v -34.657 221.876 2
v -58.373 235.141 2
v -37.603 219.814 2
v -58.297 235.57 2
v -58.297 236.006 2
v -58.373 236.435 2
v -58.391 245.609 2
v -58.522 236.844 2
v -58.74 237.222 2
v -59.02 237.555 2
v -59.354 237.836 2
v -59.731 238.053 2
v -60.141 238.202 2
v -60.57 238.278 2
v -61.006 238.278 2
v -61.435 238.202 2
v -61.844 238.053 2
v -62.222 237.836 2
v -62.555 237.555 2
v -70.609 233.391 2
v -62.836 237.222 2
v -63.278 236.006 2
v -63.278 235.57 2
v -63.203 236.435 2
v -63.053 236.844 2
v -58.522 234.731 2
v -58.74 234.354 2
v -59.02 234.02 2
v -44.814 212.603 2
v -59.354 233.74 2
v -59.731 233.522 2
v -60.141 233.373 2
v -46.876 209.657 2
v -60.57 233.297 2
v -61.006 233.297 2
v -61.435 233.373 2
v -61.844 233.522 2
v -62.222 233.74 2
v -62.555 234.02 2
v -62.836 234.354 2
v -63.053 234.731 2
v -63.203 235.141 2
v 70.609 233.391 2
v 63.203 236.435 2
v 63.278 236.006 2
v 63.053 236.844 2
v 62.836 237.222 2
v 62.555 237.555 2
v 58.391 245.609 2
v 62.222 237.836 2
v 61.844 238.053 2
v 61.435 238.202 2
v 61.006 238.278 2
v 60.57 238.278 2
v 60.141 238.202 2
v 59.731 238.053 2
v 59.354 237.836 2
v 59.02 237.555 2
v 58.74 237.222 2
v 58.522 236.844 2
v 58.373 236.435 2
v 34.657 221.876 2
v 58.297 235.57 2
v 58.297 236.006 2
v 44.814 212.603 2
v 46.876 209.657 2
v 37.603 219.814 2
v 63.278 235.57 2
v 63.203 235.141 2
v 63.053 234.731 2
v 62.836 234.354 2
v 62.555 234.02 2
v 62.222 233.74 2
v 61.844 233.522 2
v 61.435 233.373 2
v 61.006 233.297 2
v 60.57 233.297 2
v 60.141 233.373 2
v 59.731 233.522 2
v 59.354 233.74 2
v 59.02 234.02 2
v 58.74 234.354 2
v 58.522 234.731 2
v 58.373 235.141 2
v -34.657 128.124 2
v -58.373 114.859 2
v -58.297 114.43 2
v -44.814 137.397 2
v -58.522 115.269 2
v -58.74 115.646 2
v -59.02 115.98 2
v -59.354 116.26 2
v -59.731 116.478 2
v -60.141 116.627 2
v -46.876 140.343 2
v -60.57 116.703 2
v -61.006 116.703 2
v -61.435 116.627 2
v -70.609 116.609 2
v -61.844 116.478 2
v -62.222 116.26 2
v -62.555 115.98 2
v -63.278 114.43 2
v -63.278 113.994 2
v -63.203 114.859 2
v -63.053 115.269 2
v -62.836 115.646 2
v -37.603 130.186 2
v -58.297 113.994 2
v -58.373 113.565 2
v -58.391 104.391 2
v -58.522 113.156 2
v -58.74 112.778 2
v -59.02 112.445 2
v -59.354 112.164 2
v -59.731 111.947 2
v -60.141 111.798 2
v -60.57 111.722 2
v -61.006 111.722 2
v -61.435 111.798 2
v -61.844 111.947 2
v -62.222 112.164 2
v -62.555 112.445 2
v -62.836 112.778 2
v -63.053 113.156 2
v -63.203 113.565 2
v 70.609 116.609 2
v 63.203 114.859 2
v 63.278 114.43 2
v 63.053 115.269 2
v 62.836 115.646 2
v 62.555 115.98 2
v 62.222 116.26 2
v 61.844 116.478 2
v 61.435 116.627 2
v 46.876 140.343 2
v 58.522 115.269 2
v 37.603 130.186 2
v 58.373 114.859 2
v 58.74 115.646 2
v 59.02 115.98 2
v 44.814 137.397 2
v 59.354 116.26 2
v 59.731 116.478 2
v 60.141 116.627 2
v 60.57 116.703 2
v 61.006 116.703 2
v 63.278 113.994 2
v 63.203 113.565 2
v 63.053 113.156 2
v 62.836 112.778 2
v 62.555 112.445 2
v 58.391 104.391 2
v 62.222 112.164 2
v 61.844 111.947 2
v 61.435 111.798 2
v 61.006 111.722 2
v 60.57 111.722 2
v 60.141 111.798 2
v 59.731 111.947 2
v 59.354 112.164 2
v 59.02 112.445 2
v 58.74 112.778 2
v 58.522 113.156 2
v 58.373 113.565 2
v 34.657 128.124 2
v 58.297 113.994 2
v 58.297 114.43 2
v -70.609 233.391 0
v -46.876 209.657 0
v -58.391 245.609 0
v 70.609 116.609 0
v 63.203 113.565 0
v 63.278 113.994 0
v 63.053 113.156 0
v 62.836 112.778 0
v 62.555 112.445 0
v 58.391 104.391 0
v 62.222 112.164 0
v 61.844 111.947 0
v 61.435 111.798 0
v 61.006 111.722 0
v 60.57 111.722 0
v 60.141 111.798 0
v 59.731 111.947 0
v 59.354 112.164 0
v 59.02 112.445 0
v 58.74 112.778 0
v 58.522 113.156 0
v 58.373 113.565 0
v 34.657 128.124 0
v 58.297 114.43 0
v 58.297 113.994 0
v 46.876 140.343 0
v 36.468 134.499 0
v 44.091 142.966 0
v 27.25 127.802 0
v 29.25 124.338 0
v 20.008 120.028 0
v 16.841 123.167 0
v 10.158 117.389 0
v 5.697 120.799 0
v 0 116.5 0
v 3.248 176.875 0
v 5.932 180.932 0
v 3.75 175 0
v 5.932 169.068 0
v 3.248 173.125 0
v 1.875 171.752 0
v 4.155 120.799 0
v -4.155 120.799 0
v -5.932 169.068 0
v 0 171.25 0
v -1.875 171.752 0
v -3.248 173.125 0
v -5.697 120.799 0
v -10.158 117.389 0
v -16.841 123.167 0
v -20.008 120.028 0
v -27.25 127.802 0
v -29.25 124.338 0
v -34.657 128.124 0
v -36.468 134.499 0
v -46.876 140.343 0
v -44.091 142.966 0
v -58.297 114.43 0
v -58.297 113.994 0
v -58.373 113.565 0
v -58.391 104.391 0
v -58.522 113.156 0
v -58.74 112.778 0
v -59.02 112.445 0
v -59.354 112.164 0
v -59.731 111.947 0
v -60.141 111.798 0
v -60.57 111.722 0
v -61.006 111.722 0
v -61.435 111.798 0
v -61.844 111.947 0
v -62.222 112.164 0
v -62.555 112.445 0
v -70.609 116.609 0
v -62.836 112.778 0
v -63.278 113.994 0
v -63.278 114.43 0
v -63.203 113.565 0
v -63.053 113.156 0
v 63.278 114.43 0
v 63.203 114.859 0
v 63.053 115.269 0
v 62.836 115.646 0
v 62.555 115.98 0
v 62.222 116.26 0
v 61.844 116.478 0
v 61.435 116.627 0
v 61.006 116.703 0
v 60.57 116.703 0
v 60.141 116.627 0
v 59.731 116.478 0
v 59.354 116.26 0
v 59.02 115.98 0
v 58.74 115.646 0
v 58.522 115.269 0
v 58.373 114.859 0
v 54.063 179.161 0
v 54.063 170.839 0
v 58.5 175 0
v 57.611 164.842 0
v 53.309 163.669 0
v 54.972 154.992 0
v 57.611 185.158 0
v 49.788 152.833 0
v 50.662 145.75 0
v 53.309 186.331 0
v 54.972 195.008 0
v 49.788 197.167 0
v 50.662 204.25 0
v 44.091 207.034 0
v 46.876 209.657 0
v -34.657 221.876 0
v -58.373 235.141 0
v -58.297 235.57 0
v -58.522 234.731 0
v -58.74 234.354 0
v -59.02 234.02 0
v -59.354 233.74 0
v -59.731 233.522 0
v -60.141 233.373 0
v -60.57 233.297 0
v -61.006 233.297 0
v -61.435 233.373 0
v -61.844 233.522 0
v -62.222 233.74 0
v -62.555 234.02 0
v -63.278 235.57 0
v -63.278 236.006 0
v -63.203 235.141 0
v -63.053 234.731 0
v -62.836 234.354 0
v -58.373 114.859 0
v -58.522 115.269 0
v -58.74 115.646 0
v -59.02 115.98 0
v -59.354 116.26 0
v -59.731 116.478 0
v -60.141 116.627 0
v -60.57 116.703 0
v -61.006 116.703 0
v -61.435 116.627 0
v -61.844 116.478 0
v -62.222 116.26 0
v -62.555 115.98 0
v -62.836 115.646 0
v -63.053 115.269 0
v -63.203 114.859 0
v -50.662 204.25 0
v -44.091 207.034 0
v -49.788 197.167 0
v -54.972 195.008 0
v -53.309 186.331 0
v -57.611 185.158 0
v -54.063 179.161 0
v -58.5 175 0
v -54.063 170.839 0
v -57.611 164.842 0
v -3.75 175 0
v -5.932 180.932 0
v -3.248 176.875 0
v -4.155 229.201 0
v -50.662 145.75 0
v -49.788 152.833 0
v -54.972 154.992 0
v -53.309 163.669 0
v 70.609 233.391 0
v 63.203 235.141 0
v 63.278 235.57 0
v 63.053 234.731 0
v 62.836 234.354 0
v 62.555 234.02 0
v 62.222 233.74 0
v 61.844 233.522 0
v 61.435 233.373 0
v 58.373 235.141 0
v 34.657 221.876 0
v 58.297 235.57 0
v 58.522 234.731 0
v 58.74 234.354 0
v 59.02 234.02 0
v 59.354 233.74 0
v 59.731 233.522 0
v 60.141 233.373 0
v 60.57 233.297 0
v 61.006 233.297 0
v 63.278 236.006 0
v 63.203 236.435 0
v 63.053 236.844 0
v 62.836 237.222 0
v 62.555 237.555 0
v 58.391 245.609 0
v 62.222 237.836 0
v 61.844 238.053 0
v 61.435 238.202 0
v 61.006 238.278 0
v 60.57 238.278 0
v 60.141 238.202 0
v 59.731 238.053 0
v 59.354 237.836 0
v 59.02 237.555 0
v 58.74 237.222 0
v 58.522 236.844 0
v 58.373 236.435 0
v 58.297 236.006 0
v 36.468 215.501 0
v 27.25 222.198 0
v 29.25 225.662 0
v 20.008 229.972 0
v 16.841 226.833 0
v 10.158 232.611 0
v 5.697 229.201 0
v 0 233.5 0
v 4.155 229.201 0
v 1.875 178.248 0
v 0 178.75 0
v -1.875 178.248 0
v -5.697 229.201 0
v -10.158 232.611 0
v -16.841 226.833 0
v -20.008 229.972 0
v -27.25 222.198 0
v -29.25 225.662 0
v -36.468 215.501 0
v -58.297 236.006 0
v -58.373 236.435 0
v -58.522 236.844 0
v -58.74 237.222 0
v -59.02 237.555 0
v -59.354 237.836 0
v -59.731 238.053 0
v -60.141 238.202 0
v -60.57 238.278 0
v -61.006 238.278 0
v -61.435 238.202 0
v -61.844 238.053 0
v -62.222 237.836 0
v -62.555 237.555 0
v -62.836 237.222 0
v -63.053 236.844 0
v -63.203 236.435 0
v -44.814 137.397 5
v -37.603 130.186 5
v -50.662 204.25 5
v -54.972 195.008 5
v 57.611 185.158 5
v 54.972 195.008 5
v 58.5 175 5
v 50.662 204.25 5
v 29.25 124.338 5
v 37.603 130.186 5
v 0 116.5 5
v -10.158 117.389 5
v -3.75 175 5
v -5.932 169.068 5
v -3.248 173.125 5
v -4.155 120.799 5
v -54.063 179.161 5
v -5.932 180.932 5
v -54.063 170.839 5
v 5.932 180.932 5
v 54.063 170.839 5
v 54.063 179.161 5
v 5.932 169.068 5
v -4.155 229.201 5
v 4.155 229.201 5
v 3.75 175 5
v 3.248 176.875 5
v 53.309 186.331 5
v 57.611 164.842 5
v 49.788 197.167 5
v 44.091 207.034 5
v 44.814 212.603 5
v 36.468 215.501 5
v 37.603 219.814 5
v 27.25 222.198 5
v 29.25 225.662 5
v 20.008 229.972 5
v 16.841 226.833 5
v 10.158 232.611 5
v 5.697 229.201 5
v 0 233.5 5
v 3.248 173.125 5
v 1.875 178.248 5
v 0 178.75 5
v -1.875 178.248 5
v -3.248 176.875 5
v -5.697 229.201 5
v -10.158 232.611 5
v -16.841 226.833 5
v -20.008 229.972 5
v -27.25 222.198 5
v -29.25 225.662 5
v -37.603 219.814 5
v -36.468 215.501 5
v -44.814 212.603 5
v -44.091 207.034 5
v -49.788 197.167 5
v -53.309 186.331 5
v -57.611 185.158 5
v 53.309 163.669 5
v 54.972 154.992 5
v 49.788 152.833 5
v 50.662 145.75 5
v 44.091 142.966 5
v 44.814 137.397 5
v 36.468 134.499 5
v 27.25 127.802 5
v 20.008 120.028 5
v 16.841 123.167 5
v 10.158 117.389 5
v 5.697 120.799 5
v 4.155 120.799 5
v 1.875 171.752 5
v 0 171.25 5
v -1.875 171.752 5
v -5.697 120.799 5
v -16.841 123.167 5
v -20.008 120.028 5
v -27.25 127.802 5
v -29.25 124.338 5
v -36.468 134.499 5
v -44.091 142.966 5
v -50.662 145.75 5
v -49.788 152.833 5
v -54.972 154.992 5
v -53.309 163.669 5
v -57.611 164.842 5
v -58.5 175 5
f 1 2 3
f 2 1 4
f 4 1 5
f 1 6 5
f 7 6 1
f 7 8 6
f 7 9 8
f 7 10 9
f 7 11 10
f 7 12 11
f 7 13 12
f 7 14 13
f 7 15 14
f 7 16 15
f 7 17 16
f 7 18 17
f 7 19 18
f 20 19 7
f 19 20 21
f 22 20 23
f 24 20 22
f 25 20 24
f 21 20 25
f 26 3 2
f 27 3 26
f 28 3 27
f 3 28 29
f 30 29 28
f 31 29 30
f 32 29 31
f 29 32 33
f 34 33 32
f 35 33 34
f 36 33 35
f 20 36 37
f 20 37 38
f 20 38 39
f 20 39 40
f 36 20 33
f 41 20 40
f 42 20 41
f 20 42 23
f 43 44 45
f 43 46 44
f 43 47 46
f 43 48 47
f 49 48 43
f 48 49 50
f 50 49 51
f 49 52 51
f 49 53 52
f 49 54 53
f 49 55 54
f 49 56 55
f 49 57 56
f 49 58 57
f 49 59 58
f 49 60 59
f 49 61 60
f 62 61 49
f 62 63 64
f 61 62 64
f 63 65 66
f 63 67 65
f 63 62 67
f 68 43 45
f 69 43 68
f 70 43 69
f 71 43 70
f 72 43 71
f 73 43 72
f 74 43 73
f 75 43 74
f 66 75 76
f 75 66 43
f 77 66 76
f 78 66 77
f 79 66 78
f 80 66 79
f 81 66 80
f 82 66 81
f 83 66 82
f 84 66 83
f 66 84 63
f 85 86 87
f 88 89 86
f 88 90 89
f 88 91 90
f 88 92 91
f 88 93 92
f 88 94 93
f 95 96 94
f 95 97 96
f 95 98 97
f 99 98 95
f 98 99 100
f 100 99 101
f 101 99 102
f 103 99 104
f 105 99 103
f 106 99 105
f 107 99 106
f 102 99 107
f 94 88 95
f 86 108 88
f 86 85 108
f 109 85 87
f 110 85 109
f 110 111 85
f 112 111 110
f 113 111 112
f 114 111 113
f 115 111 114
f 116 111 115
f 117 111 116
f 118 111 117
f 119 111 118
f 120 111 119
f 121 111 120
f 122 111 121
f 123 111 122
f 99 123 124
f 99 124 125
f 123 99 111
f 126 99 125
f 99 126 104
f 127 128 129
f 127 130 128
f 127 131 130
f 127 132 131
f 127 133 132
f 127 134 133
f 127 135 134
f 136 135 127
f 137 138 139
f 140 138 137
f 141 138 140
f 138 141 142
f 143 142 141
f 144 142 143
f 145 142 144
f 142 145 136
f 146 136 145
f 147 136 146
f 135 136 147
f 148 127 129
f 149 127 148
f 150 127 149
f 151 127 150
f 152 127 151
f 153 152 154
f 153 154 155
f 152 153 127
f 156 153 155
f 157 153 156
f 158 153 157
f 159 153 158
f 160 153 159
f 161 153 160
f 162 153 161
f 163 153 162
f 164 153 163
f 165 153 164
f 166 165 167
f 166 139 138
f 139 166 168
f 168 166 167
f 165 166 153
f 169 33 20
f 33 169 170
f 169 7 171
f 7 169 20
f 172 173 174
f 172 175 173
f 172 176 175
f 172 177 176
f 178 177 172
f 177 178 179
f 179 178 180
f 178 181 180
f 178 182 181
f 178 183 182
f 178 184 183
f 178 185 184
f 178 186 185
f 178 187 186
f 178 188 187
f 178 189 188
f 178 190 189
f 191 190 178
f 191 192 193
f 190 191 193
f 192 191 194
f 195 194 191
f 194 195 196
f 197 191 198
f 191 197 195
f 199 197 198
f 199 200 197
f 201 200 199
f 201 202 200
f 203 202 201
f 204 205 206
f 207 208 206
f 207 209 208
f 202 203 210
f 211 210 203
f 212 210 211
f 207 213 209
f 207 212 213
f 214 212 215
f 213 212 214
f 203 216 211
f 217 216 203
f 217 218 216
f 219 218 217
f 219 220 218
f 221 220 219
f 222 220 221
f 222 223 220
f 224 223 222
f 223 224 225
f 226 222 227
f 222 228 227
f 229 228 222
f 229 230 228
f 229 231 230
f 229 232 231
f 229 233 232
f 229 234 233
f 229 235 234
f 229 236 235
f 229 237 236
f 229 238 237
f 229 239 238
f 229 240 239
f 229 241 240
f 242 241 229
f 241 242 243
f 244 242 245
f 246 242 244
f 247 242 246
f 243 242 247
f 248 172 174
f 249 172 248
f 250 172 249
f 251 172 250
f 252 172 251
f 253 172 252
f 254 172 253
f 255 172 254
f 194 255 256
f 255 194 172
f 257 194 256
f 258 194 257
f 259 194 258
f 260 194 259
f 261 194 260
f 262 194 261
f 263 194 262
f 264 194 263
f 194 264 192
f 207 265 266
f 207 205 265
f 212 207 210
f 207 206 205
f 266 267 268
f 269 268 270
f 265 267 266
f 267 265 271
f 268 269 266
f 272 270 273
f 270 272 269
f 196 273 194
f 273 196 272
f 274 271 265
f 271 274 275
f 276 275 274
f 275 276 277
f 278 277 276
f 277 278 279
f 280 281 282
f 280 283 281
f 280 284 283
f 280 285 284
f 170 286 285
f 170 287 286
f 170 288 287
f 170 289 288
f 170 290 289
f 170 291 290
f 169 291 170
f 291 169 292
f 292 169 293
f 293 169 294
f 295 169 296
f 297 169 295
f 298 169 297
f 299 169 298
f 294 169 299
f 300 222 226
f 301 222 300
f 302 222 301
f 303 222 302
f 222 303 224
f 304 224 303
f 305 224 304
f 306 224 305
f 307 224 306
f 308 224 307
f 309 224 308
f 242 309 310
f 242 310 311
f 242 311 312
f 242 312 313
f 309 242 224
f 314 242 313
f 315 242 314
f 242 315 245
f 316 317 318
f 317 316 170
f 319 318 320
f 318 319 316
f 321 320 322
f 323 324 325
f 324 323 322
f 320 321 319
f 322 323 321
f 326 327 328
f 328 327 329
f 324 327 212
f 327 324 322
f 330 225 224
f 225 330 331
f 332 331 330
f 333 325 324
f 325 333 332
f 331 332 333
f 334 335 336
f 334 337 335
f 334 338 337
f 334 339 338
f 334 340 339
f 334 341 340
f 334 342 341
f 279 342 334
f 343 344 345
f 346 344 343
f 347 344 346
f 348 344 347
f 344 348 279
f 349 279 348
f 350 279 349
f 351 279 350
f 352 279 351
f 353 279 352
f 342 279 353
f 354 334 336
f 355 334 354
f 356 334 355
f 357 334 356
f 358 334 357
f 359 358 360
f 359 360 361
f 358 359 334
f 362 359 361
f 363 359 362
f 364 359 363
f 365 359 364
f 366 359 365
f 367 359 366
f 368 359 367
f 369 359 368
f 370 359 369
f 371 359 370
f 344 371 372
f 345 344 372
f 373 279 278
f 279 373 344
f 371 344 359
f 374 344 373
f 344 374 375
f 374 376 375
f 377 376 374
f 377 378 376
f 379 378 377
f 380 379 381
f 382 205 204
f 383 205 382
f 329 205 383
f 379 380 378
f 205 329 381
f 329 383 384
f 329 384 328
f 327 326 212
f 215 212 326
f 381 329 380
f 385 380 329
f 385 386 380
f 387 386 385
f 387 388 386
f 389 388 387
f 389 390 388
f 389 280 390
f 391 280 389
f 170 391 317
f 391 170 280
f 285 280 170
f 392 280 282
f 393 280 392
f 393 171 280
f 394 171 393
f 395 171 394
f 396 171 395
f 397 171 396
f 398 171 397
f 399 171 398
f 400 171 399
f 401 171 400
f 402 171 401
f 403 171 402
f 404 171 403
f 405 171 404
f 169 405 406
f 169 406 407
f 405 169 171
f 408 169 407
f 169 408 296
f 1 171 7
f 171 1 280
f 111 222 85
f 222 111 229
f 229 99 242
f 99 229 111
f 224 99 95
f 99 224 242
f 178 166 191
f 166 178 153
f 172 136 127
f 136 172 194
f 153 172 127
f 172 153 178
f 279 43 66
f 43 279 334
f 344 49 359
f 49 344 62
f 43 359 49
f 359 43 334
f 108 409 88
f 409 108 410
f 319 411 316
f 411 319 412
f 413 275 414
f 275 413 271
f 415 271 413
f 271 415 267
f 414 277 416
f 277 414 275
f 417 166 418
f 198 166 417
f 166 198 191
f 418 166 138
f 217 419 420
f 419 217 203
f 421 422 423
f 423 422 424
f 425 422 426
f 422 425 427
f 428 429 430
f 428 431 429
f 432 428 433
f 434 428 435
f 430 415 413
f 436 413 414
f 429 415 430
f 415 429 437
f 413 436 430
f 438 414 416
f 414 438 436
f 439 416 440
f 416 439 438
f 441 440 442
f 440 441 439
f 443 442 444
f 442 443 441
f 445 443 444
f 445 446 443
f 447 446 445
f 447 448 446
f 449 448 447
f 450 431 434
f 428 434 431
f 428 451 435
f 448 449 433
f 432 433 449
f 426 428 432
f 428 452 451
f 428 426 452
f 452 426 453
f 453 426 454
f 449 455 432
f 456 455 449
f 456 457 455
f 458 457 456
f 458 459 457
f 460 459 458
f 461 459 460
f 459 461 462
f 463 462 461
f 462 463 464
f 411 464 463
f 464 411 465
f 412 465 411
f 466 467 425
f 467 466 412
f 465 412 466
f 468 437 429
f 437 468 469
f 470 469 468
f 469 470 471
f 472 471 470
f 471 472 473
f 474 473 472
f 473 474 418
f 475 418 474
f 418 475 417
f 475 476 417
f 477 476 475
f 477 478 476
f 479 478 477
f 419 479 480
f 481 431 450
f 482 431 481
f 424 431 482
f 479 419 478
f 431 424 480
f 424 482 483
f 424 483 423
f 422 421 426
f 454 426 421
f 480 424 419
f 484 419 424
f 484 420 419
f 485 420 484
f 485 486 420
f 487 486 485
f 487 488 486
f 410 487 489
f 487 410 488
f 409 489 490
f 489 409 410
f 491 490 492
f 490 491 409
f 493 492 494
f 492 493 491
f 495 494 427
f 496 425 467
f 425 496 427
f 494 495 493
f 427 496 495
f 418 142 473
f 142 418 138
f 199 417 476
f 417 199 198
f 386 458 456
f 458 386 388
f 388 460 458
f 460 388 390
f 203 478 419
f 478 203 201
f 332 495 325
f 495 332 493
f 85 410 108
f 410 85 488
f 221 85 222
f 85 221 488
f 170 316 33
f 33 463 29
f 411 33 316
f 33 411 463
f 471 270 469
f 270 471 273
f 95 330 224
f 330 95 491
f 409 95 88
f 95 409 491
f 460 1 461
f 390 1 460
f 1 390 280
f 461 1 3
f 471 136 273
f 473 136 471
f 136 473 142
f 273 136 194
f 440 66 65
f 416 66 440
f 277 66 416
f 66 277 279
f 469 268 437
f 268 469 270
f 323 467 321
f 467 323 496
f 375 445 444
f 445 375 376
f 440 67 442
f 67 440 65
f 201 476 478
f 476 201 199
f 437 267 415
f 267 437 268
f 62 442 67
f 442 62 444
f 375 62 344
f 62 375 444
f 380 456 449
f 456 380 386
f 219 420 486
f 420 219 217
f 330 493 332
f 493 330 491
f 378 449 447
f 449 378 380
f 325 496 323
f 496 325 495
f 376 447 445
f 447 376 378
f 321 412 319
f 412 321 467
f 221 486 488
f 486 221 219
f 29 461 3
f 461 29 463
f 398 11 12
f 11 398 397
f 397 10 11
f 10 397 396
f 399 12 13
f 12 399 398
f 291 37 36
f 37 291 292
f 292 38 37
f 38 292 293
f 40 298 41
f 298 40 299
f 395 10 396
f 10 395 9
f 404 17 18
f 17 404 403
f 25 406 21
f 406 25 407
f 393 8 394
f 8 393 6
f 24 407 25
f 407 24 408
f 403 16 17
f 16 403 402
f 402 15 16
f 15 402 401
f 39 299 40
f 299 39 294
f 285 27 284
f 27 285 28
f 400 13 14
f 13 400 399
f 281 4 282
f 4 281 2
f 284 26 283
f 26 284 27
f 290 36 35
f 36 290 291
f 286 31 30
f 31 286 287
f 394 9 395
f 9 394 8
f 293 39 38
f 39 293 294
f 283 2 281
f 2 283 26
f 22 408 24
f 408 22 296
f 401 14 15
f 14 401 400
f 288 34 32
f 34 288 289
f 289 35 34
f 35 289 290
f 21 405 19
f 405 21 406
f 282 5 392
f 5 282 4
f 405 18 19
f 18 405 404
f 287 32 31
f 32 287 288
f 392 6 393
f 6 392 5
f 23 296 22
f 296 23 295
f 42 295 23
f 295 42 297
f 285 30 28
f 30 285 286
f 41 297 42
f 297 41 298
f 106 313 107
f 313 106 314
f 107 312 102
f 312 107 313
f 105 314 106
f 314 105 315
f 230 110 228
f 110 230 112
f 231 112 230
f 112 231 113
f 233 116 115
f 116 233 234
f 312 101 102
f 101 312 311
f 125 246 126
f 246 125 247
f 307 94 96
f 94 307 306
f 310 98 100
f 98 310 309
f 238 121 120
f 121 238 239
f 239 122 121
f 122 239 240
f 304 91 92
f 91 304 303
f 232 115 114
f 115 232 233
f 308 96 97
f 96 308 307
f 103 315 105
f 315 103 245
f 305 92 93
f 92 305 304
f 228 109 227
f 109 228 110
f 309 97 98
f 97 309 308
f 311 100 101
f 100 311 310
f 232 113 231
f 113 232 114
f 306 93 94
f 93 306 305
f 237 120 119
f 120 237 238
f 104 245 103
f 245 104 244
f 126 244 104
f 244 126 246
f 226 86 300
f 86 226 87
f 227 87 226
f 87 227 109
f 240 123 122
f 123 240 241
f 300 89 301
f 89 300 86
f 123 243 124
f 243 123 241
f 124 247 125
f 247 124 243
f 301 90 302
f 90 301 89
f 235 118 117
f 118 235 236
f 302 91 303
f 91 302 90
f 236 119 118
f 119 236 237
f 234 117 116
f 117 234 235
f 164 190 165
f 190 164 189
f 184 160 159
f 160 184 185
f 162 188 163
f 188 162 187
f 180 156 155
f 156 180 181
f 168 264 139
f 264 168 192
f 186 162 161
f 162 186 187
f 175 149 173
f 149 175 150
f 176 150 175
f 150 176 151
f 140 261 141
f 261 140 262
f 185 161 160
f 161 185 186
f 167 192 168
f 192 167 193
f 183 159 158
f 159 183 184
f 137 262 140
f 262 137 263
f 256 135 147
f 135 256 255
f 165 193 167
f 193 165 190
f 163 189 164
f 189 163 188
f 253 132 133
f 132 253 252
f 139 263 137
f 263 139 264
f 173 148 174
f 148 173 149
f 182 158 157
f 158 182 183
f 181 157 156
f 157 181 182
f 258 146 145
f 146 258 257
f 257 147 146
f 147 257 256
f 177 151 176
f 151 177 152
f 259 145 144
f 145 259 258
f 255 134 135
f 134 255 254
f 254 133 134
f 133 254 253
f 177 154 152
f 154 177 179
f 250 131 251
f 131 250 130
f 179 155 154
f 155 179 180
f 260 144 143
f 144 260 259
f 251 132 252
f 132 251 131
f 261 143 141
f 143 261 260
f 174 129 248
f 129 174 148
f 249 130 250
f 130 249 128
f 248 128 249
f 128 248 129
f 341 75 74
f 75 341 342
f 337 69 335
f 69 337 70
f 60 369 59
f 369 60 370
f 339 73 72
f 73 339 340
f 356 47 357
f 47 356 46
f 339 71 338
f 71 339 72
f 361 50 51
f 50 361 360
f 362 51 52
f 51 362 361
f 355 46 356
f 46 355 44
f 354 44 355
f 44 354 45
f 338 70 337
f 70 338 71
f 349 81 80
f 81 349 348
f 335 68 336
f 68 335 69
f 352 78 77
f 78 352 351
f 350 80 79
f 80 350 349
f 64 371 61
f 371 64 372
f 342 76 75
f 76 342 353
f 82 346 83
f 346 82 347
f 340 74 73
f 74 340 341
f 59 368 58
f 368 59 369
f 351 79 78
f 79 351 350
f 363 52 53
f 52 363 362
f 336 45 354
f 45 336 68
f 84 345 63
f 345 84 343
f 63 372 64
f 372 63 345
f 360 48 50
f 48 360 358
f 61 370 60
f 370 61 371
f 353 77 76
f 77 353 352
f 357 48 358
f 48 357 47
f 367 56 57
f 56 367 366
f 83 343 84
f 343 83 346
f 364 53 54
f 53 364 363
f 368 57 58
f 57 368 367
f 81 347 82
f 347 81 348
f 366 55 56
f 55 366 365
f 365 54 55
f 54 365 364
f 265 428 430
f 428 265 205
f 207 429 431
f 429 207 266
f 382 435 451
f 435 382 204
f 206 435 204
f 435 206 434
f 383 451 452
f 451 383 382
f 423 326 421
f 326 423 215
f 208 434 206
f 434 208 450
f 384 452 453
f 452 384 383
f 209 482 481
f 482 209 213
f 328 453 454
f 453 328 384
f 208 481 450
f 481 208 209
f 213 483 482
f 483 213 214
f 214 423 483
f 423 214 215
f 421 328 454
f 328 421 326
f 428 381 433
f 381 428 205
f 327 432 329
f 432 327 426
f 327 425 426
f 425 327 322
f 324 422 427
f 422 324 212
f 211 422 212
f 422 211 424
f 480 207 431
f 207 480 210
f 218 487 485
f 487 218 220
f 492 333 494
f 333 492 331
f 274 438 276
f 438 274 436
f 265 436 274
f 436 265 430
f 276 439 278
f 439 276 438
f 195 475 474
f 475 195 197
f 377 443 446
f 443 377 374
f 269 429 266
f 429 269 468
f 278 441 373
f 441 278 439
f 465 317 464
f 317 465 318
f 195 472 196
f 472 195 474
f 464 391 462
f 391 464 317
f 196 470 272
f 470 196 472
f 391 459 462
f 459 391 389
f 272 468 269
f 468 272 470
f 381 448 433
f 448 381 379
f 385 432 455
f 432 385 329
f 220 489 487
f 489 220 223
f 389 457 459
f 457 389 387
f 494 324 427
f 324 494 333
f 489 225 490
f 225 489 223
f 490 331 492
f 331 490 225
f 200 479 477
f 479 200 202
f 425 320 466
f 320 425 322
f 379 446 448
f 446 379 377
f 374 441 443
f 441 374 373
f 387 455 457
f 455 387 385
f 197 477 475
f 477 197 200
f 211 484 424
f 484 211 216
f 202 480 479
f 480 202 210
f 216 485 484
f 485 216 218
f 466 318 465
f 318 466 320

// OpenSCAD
/* 
  Lazy Susan Rotary Encoder mount:
  
  Mount for lazy susan with a rotary encoder slot in the middle to allow for detection of rotation.
  
  [Design borrowed heavily from Phat Justice]  
*/

doProj                  = false;   // Do 2D projection to allow to print
quality                 = 36;      // "Roundness" of circles.

// Thicknesss
OuterThickness          = 2;       // Thickness of outer stuff
InnerThickness          = 5;       // Thickness of inner stuff
WallThickness           = 2;       // Thickness of the wall

// Spokes
spokes                   = 4;
SpokeDiameter            = 4.15;

// ## TOP SETTINGS ########################
TopPillarDimension       = 6.9;
TopPillarHeight          = 5;
TopPillarDistance        = 150;    // measured edge to edge

// Screw holes
TopScrewHoleDimension    = 2;

TopCenterBoreDiameter    = 116;    // That huge hole in the middle of the bearing
TopArmLength             = sqrt(2 * (TopPillarDistance/2 * TopPillarDistance/2));
TopArmWidth              = 13.28;

// ## BOTTOM SETTINGS ########################
BottomCenterBoreDiameter = 113;    // That huge hole in the middle of the bearing

// Bottom screw holes
BottomHoleDimension      = 5;
BottomHoleDistance       = 129;    // measured edge to edge

// Center hole
BottomCenterHoleDiameter = 7.5;

// Arms
BottomArmLength          = sqrt(2 * (BottomHoleDistance/2 * BottomHoleDistance/2));
BottomArmWidth           = 13.28;

if (doProj) {
  projection() bottom_plate();
}
else {
  bottom_plate();
}

module top_plate()  {
  render() {
    difference()
    {
      union()
      {
        // Center of the adapter plate
        cylinder(r=TopCenterBoreDiameter/2 + WallThickness, h=InnerThickness, $fn=quality);
        
        // Arms
        for (i = [0:4])
        {
          rotate([0,0,45+i*90])
          {
            translate([-((TopArmWidth/2) + WallThickness),0,0]) //The base arm
              cube([TopArmWidth + (WallThickness * 2), TopArmLength, WallThickness]);
           }
        }
        
        // Pillars
        for (i = [0:3])
        {
          rotate ( [0,0,45+(i*90)] )
          {
            translate ( [0, TopArmLength - 5.25, 0] )
            {
              cylinder ( r=TopPillarDimension/2, h=TopPillarHeight, $fn=quality );
            }
          }
        }
      }
      
      // NOW TO REMOVE STUFFFFFF...
      if (doProj) {
        // Make the pillars wholes so it can be 2D printed
        for (i = [0:3])
        {
          rotate ( [0,0,45+(i*90)] )
          {
            //Screw Holes to mount plate to bearing
            translate ( [0, TopArmLength - 5.25, 0] )
            {
              cylinder ( r=TopPillarDimension/2, h=OuterThickness, $fn=quality );
            }
          }
        }
      }
      
      // Screw holes
      for (i = [0:3])
      {
        rotate ( [0,0,45+(i*90)] )
        {
          translate ( [-7, TopArmLength - 12.25, 0] )
          {
            cylinder ( r=TopScrewHoleDimension/2, h=TopPillarHeight, $fn=quality );
          }
        }
      }
      
      // Hollow out the center to save plastic!
      difference()
      {
        // This is the big hole
        cylinder(r=(TopCenterBoreDiameter/2)-WallThickness, h=TopPillarHeight); 
        union()
        {
          for (i=[0:(spokes-1)])
          {
            difference()
            {
              rotate ([0,0,i*(360/spokes)])
              {
                // making tapered spokes
                hull()
                {
                  cylinder(r=SpokeDiameter + WallThickness, h=TopPillarHeight, $fn=quality);
                  translate([(TopCenterBoreDiameter/2)+(WallThickness)-SpokeDiameter,0,0])
                  {
                      cylinder(r=SpokeDiameter, h=TopPillarHeight, $fn=quality);
                  }
                }
              }
              difference() {
                cylinder(r=3.2,h=TopPillarHeight);
                translate([-5,-6.5-.2,0]) cube([10,5,10-2]);//the center screw hole
              }
            }
          }
        }
      }
    }
  }
}

module bottom_plate()  {
  render() {
    translate([0,175,0]) {
    difference()
    {
      union()
      {
        // Center of the bottom plate
        cylinder(r=BottomCenterBoreDiameter/2 + WallThickness, h=InnerThickness, $fn=quality);
        
        // Arms
        for (i = [0:4])
        {
          rotate([0,0,45+i*90])
          {
            translate([-((BottomArmWidth/2) + WallThickness),0,0]) //The base arm
              cube([BottomArmWidth + (WallThickness * 2), BottomArmLength, WallThickness]);
          }
        }       
      }
          
      // NOW TO REMOVE STUFFFFFF...

      // The four holes
      for (i = [0:3])
      {
        rotate ( [0,0,45+(i*90)] )
        {
          translate ( [0, BottomArmLength - 5.25, 0] )
          {
            cylinder ( r=BottomHoleDimension/2, h=OuterThickness, $fn=quality );
          }
        }
      }
      
      //Hollow out the center to save plastic!
      difference()
      {
        // This is the big hole
        cylinder(r=(BottomCenterBoreDiameter/2)-WallThickness, h=InnerThickness); 
        union()
        {
          for (i=[0:(spokes-1)])
          {
            difference()
            {
              rotate ([0,0,i*(360/spokes)])
              {
                // making tapered spokes
                hull() 
                {
                  cylinder(r=SpokeDiameter + WallThickness, h=InnerThickness, $fn=quality);
                  translate([(BottomCenterBoreDiameter/2)+(WallThickness)-SpokeDiameter,0,0])
                  {
                    cylinder(r=SpokeDiameter, h=InnerThickness, $fn=quality);
                  }
                }
              }
              difference() {
                cylinder(r=BottomCenterHoleDiameter/2, h=InnerThickness);
              }
            }
          }
        }
      }
    }
  }}
}
